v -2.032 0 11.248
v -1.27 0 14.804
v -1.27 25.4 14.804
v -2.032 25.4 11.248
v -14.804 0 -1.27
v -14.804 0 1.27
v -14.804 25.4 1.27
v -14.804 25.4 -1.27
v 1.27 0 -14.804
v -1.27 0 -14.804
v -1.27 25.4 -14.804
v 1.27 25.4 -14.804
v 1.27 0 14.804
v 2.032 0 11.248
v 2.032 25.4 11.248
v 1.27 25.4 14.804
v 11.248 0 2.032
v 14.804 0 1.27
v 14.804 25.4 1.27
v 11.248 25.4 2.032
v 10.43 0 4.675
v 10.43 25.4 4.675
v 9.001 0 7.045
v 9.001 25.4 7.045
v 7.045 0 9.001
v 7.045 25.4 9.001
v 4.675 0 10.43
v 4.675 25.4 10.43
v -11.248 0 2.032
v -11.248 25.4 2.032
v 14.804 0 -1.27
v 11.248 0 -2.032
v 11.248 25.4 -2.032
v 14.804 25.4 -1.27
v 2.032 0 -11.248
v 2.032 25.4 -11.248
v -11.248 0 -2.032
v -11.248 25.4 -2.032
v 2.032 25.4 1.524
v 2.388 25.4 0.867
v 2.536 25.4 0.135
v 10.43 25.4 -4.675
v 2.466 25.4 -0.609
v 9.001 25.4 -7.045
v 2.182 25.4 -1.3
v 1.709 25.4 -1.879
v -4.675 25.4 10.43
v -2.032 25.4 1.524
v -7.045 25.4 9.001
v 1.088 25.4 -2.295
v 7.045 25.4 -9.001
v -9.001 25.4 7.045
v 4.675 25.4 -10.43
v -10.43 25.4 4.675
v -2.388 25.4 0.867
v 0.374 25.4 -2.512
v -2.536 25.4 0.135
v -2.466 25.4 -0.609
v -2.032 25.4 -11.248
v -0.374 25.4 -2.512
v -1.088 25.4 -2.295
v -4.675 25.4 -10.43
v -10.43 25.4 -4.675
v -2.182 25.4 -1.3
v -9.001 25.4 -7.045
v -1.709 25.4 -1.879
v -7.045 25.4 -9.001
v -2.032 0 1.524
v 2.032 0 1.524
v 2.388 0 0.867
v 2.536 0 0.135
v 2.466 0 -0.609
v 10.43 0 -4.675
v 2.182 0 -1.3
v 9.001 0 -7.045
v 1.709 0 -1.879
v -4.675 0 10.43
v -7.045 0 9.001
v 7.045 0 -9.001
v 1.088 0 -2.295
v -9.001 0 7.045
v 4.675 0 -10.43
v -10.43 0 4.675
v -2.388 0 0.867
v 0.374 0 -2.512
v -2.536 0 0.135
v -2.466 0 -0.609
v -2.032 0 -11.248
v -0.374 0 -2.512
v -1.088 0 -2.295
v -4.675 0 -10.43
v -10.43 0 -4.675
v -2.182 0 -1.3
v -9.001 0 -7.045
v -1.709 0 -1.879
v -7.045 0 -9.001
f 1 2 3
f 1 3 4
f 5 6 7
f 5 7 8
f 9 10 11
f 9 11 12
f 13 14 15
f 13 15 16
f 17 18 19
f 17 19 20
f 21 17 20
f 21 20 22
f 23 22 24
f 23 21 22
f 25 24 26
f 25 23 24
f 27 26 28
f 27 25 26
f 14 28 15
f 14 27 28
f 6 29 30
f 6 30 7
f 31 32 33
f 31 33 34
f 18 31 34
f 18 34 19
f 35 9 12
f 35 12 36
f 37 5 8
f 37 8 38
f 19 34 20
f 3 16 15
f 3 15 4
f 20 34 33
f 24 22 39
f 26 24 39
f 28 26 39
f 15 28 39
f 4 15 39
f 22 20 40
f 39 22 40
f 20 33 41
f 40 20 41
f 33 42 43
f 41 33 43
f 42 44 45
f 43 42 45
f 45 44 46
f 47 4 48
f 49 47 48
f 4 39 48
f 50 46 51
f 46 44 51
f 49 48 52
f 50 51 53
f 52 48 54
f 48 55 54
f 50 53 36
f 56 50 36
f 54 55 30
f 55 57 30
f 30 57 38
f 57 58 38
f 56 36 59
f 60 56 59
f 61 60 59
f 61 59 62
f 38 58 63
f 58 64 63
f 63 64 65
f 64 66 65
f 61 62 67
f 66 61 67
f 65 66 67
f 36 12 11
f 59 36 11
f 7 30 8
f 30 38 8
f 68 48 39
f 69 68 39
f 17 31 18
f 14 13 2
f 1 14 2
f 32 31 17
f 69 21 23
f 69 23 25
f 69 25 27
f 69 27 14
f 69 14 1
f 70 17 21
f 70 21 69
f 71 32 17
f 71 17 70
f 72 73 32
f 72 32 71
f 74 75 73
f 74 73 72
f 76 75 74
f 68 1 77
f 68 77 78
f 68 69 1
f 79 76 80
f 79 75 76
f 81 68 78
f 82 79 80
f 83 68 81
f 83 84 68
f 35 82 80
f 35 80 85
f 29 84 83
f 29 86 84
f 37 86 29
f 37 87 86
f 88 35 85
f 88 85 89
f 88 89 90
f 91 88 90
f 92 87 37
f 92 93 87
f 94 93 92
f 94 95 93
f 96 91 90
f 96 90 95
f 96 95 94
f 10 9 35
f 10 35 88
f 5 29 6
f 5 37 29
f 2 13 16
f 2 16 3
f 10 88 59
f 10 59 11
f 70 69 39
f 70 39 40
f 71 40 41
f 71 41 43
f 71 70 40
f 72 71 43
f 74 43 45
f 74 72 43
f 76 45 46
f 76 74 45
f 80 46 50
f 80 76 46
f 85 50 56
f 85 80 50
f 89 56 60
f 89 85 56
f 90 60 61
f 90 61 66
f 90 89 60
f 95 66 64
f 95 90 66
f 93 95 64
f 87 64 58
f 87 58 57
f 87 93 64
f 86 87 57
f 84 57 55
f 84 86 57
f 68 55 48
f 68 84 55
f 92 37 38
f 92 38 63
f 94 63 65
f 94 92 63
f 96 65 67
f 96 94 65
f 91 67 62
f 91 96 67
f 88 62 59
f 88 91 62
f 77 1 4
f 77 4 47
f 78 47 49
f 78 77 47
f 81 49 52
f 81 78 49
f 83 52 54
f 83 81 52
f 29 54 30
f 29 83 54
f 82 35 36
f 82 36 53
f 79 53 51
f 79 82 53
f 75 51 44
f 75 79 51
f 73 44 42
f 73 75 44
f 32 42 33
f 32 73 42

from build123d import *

# Parameters (mm, degrees)
BOSS_EXTRUDE1_DEPTH = 25.4


with BuildPart() as part:
    # Sketch1 → Boss-Extrude1 (new body)
    with BuildSketch(Plane(origin=(0, 0, 0), x_dir=(1, 0, 0), z_dir=(0, 1, 0))):
        with BuildLine():
            Line((-2.032, 11.247927631), (-1.27, 14.803927631))
            Line((-1.27, 14.803927631), (1.27, 14.803927631))
            Line((1.27, 14.803927631), (2.032, 11.247927631))
            ThreePointArc((2.032, 11.247927631), (8.082230509, 8.082230509), (11.247927631, 2.032))
            Line((11.247927631, 2.032), (14.803927631, 1.27))
            Line((14.803927631, 1.27), (14.803927631, -1.27))
            Line((14.803927631, -1.27), (11.247927631, -2.032))
            ThreePointArc((11.247927631, -2.032), (8.082230509, -8.082230509), (2.032, -11.247927631))
            Line((2.032, -11.247927631), (1.27, -14.803927631))
            Line((1.27, -14.803927631), (-1.27, -14.803927631))
            Line((-1.27, -14.803927631), (-2.032, -11.247927631))
            ThreePointArc((-2.032, -11.247927631), (-8.082230509, -8.082230509), (-11.247927631, -2.032))
            Line((-11.247927631, -2.032), (-14.803927631, -1.27))
            Line((-14.803927631, -1.27), (-14.803927631, 1.27))
            Line((-14.803927631, 1.27), (-11.247927631, 2.032))
            ThreePointArc((-11.247927631, 2.032), (-8.082230509, 8.082230509), (-2.032, 11.247927631))
        make_face()
        with BuildLine():
            Line((-2.032, -1.524), (2.032, -1.524))
            ThreePointArc((2.032, -1.524), (0, 2.54), (-2.032, -1.524))
        make_face(mode=Mode.SUBTRACT)
    extrude(amount=BOSS_EXTRUDE1_DEPTH)


solid = part.part
